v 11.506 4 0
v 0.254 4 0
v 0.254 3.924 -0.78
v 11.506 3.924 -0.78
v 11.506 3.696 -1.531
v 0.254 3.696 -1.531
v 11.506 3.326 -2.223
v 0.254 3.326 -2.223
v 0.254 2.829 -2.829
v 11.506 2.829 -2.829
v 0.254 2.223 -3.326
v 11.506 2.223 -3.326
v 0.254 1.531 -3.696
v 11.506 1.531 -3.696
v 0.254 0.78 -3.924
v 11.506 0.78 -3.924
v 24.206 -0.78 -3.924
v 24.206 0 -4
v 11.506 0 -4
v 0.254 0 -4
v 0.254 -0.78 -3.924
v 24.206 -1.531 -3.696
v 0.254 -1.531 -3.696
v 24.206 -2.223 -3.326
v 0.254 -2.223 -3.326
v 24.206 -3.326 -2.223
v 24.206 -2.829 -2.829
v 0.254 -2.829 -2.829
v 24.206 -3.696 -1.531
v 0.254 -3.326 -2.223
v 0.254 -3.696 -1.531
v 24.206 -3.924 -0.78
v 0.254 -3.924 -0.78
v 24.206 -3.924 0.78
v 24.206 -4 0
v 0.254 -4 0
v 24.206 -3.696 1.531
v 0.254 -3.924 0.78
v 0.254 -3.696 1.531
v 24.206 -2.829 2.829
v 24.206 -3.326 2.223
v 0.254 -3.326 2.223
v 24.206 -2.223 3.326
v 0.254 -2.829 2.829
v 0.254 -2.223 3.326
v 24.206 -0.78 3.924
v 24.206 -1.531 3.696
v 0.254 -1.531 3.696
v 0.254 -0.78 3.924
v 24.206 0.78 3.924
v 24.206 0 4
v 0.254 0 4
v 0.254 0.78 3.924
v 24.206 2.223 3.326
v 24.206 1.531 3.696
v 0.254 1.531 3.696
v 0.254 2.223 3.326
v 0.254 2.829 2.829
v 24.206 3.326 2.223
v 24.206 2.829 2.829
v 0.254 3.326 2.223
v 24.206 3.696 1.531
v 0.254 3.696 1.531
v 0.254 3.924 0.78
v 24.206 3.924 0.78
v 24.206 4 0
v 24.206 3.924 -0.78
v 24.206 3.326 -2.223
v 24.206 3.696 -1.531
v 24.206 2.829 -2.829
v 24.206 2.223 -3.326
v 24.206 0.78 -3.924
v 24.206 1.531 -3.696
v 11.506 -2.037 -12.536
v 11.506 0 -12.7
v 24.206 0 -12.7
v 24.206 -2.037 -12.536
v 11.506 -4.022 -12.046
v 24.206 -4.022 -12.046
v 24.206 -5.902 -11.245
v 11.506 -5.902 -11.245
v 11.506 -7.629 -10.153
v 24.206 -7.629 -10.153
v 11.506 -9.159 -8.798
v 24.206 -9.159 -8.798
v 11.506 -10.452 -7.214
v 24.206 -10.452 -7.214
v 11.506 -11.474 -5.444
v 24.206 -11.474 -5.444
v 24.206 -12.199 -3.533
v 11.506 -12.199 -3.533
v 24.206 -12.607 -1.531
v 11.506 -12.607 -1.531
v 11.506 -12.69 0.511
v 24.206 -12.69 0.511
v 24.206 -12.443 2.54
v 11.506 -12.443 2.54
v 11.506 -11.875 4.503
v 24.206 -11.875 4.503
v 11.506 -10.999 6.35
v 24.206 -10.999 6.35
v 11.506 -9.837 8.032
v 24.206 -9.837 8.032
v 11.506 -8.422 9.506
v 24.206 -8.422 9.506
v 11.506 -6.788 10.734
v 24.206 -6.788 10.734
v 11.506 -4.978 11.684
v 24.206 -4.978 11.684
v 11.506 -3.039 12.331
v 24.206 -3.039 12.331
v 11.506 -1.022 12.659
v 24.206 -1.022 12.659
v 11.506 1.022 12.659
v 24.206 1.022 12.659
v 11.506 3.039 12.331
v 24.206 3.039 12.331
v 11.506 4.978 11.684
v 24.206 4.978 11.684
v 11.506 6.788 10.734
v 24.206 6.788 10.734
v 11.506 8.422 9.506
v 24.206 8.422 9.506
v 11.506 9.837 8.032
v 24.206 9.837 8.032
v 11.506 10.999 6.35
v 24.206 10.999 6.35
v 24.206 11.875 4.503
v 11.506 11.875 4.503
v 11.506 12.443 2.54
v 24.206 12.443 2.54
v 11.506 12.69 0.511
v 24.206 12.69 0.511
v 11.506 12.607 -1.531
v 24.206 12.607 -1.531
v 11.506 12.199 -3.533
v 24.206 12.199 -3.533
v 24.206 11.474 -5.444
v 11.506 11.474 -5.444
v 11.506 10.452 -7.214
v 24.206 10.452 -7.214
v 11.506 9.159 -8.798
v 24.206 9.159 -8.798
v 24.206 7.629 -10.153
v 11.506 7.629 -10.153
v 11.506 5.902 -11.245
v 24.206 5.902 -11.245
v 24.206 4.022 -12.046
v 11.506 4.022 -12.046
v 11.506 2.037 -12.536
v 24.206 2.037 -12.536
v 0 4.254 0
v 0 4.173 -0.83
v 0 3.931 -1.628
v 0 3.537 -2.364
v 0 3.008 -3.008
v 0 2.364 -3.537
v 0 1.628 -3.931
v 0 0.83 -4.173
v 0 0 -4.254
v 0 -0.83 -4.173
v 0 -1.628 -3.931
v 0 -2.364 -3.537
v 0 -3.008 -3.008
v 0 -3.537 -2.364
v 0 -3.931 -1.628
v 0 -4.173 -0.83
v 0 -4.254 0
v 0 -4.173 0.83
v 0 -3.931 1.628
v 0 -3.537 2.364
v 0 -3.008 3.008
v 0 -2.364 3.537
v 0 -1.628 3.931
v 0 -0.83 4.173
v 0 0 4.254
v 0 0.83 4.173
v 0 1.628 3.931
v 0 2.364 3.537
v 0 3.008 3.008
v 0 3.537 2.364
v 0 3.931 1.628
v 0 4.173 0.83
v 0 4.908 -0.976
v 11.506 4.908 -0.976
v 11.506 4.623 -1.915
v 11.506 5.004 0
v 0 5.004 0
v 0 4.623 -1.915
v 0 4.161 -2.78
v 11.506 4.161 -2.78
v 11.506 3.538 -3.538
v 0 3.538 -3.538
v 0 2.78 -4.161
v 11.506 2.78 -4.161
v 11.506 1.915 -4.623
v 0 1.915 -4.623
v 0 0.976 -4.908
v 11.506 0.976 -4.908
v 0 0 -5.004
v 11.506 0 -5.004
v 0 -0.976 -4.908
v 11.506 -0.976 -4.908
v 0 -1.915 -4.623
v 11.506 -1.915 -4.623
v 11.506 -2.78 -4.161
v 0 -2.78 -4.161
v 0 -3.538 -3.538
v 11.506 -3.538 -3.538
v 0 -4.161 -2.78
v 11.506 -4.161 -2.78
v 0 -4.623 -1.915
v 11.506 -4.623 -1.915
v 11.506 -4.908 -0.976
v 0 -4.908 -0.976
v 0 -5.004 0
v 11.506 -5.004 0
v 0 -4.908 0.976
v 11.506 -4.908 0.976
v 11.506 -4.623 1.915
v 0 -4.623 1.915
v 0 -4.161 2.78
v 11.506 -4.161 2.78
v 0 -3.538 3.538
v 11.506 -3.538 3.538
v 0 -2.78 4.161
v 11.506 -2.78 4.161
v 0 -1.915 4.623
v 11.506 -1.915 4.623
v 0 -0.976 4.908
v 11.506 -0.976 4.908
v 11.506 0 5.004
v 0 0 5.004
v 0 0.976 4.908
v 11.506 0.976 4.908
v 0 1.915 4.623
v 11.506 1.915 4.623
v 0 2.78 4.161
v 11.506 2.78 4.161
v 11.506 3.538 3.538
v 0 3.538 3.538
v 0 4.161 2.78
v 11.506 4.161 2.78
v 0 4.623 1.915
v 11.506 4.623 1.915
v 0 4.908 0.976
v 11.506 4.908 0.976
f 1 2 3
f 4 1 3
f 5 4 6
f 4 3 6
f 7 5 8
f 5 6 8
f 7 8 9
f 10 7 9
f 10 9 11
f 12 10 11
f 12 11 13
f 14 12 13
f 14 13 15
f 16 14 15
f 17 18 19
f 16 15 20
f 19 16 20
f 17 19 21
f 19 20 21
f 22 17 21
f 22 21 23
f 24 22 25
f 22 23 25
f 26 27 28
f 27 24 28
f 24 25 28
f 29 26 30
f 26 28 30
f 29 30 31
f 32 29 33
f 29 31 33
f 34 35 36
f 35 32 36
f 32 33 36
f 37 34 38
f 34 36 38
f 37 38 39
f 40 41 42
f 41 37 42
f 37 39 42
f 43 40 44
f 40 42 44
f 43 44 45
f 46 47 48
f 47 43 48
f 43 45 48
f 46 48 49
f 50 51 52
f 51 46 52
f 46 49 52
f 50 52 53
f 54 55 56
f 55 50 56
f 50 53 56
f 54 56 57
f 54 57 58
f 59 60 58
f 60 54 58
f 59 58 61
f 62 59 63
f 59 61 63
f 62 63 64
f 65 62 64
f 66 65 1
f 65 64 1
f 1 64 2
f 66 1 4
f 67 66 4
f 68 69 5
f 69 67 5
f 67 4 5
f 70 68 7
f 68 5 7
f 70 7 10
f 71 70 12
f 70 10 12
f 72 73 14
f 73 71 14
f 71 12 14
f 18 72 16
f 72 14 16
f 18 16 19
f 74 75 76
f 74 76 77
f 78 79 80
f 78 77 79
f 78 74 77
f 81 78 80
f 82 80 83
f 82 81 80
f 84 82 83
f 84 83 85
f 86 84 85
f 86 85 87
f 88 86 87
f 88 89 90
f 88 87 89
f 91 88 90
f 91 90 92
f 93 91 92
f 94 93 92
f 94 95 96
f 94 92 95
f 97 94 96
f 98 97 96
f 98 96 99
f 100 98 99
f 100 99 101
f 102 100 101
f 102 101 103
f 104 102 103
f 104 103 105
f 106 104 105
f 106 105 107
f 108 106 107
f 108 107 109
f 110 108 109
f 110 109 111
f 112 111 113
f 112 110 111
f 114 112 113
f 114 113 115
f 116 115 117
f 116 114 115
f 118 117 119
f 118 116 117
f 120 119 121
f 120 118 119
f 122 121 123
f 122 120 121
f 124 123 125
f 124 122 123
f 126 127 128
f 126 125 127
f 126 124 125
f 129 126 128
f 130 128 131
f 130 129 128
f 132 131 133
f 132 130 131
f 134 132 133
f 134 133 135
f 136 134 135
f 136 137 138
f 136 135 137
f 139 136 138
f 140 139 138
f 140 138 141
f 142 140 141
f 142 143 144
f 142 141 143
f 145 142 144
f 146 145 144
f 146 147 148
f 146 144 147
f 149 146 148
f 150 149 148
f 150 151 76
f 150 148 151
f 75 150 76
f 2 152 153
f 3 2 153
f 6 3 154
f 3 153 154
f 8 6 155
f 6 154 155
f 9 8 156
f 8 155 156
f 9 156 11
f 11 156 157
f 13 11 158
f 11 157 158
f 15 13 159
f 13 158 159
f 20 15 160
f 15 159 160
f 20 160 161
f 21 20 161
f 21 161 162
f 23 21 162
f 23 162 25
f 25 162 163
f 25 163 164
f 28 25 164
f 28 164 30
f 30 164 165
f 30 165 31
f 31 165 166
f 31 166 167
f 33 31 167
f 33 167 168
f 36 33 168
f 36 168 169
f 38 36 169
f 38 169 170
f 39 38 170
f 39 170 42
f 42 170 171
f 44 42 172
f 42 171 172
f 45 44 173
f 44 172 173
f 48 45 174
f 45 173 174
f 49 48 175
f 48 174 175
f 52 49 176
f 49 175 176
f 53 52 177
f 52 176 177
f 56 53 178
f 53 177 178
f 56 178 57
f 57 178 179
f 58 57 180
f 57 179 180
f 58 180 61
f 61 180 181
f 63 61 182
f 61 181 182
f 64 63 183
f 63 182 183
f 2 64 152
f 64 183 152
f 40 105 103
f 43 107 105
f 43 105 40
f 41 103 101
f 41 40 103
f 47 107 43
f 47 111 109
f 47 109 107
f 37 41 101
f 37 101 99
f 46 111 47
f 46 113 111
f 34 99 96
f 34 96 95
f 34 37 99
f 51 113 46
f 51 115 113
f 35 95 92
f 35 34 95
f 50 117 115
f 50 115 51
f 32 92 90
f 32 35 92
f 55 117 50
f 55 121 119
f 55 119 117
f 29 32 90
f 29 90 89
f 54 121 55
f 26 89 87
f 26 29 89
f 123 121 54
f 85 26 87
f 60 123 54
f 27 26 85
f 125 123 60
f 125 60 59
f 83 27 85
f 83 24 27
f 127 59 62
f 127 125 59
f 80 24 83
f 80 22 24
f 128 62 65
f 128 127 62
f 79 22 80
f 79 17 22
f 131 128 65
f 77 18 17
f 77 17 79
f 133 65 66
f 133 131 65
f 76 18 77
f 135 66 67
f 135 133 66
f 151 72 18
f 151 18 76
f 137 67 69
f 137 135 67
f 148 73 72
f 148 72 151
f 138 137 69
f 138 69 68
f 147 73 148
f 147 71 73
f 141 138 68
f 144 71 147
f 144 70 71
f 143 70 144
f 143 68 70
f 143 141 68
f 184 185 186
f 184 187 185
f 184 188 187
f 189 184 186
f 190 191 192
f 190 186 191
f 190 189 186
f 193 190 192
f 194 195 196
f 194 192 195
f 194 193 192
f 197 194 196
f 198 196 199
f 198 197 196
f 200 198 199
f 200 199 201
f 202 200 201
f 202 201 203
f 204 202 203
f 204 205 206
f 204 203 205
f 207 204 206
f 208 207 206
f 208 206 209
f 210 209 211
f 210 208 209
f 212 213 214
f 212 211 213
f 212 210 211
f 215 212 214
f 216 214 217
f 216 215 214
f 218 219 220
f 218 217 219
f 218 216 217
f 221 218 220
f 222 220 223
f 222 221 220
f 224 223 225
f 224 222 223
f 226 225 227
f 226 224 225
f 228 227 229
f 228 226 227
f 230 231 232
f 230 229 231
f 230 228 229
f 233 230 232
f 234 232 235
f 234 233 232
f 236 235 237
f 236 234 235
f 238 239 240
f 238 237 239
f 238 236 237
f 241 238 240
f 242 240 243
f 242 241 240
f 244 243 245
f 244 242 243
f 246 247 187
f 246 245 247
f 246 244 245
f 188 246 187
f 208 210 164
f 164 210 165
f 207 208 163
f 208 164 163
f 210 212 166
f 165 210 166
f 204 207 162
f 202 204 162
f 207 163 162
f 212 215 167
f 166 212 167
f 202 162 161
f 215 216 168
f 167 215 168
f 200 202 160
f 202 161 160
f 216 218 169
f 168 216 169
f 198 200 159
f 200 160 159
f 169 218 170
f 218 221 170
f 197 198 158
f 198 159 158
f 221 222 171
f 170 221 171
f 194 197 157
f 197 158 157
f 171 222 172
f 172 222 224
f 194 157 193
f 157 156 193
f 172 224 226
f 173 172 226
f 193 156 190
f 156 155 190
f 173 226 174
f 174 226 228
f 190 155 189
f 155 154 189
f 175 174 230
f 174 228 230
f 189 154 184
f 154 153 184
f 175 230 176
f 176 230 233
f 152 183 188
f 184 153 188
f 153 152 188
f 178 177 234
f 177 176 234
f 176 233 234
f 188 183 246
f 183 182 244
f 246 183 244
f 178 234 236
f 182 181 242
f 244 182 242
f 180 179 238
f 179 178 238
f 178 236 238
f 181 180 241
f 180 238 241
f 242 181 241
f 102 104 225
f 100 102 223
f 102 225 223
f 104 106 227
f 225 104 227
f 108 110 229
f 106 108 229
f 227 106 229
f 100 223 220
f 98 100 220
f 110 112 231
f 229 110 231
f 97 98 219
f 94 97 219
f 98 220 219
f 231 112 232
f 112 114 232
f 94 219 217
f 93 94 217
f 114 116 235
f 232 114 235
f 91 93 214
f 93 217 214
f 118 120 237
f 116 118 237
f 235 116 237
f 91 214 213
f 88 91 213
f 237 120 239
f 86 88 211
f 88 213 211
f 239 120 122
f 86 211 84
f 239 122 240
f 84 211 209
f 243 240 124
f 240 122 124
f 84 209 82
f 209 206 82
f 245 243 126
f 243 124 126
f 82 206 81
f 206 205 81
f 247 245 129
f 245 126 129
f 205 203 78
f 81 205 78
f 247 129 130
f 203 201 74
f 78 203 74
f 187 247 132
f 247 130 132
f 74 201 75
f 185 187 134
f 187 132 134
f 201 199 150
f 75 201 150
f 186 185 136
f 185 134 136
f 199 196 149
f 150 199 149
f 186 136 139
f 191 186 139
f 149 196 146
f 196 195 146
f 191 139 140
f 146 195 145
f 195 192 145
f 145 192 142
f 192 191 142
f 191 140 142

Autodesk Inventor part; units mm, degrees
ref_plane "YZ Plane" through (0, 0, 0) normal (1, 0, 0) x (0, 1, 0)
ref_plane "XZ Plane" through (0, 0, 0) normal (0, 1, 0) x (-1, 0, 0)
ref_plane "XY Plane" through (0, 0, 0) normal (0, 0, 1) x (1, 0, 0)
sketch "Sketch1" plane through (0, 0, 0) normal (1, 0, 0) x (0, 1, 0)
  circle A0 centre (0, 0) radius 5.0038
  circle A1 centre (0, 0) radius 4.0005
  dimension "d0" = 10.0076
  dimension "d1" = 8.001
extrude "Extrusion1" add sketch "Sketch1" along normal blind 11.5062
sketch "Sketch2" plane through (11.5062, 0, 0) normal (1, 0, 0) x (0, 0, -1)
  circle A0 centre (0, 0) radius 12.7
  circle A1 centre (0, 0) radius 4.0005
  dimension "d4" = 25.4
  dimension "d7" = 8.001
extrude "Extrusion2" add sketch "Sketch2" along normal blind 12.7
chamfer "Chamfer2" distance 0.254 angle 45 1 edges at (0, -4.0005, 0)
properties part number "DTR-2"
